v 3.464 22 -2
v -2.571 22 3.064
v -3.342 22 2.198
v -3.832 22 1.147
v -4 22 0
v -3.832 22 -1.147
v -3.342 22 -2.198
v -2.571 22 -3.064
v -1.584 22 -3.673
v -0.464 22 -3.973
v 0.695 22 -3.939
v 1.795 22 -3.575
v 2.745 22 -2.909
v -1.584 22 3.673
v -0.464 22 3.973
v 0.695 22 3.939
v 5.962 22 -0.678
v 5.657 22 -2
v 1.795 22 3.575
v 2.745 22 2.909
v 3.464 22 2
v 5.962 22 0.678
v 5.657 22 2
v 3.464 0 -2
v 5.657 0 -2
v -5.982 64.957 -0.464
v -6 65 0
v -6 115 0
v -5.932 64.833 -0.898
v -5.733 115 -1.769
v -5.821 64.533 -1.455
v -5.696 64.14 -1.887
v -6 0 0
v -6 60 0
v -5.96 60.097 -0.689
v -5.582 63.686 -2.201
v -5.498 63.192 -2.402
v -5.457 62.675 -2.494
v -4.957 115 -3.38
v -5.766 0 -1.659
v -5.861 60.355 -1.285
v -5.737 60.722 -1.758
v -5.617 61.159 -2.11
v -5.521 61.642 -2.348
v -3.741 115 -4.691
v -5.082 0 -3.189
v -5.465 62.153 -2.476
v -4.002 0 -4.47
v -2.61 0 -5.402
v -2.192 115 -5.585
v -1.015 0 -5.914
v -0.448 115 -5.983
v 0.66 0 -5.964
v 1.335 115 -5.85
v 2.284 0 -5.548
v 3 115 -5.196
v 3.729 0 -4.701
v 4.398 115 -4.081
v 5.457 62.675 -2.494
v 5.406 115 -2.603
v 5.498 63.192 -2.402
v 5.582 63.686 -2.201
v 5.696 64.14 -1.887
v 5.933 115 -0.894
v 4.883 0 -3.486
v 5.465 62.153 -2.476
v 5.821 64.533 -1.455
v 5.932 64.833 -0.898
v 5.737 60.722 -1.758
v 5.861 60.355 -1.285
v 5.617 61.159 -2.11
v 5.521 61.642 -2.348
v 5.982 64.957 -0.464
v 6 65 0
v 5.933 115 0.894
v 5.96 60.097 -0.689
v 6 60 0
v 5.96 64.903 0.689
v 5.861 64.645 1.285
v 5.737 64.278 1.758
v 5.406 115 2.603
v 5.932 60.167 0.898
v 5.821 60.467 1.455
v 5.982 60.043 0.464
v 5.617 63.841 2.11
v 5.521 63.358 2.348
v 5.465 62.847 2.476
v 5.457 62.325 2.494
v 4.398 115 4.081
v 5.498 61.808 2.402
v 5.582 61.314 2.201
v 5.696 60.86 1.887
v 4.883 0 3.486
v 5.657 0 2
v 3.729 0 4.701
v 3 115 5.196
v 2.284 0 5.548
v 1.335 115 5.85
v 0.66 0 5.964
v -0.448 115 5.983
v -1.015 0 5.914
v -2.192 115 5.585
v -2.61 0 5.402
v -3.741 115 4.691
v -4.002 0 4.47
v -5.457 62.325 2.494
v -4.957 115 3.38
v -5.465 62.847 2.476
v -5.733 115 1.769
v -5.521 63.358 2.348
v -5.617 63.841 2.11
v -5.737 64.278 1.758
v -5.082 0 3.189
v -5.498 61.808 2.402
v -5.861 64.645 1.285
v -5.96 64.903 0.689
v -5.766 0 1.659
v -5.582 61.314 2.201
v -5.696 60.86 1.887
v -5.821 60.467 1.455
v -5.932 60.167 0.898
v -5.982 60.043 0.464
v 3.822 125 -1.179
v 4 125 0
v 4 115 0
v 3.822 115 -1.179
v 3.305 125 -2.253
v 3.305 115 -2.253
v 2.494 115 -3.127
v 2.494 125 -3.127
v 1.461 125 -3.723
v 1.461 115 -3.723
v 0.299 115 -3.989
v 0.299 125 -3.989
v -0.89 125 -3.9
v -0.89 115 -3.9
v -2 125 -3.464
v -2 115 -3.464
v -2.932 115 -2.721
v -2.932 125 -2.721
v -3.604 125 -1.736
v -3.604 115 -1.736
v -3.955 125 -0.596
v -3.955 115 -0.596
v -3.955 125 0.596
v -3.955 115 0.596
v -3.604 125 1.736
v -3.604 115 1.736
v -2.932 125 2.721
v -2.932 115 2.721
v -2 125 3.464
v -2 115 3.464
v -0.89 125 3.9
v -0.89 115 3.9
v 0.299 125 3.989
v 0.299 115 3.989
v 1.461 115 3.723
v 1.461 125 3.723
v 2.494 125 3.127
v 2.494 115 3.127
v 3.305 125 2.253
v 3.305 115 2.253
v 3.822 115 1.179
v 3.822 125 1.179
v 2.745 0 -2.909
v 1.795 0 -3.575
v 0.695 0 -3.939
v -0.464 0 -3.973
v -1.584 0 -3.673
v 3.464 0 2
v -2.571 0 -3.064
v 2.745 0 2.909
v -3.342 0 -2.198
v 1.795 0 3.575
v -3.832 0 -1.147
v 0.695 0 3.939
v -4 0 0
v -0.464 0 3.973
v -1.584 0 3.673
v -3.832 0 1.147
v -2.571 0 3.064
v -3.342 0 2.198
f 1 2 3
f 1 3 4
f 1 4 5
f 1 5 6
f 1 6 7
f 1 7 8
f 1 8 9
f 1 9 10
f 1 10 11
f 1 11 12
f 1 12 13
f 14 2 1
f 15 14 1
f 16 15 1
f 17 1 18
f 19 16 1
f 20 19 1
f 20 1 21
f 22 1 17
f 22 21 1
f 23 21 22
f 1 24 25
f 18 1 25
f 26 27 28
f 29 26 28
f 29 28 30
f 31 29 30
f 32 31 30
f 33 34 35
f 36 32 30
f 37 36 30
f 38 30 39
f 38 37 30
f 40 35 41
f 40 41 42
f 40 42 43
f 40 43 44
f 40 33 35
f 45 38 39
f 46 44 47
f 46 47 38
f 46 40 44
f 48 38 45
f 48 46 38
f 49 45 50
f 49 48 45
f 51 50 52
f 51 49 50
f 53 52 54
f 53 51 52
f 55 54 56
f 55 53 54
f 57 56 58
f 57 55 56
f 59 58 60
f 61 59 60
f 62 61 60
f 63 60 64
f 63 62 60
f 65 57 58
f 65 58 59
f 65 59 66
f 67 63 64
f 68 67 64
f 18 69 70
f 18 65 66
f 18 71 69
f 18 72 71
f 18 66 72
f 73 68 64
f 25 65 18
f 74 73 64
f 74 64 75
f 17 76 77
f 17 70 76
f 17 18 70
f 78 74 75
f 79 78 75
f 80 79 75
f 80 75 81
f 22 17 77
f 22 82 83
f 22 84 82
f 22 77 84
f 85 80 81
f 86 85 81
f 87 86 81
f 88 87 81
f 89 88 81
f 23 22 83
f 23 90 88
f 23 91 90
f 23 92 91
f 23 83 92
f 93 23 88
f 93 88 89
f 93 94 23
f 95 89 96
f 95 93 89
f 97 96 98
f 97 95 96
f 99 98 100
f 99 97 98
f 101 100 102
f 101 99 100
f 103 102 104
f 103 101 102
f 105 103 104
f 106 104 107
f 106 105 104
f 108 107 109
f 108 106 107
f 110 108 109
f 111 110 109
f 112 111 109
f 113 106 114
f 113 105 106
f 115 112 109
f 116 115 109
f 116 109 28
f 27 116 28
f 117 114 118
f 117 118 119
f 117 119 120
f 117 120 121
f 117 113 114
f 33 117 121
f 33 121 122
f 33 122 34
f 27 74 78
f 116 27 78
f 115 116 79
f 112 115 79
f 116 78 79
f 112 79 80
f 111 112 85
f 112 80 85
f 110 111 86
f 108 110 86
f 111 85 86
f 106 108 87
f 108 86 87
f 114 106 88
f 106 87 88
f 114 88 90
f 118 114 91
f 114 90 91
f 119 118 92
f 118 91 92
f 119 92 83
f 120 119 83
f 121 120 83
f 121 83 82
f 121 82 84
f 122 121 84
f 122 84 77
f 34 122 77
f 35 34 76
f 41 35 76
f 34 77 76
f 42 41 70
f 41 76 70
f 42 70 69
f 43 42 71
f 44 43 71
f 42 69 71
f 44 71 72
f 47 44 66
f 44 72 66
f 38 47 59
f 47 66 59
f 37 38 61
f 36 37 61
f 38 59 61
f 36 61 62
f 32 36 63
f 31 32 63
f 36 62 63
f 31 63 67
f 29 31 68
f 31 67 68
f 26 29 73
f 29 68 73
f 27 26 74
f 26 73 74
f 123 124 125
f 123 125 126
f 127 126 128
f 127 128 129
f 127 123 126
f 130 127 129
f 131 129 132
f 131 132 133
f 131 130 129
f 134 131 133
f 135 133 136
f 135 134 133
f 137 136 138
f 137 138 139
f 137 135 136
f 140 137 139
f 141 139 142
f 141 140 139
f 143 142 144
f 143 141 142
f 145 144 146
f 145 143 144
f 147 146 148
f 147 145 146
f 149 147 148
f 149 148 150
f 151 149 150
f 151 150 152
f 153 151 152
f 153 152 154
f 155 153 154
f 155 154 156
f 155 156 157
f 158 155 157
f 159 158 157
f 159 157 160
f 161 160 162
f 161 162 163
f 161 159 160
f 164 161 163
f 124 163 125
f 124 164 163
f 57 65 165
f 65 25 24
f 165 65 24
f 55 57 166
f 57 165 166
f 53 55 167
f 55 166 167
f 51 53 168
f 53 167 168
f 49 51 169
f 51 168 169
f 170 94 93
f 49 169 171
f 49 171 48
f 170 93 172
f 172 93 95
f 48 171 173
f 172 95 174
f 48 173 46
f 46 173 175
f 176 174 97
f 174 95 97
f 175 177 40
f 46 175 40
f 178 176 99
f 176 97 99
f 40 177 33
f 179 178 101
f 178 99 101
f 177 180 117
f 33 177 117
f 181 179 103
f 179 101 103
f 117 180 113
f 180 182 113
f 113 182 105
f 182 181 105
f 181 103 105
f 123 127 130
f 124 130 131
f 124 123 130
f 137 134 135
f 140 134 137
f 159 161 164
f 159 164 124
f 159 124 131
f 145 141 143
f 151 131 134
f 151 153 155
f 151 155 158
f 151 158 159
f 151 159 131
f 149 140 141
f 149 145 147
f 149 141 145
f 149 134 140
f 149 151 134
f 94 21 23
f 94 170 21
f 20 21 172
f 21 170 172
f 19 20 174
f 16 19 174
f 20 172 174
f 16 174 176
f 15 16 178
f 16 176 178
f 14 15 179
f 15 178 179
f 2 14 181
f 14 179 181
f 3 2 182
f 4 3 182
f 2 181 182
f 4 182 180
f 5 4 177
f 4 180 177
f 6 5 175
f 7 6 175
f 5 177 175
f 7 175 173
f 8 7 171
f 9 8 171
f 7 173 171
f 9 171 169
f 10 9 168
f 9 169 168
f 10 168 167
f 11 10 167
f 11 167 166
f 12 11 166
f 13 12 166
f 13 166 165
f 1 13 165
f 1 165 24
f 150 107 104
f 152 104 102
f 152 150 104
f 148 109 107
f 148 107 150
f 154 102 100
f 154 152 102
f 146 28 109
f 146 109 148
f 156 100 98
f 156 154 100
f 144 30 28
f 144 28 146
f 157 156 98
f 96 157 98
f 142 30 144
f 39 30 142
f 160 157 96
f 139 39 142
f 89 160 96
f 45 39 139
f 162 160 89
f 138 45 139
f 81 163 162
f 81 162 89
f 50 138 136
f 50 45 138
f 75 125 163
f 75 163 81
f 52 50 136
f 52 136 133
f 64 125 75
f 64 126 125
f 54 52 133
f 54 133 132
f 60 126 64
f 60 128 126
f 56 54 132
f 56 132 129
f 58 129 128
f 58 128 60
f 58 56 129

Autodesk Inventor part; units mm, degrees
ref_plane "XZ Plane" through (0, 0, 0) normal (0, 1, 0) x (-1, 0, 0)
ref_plane "XY Plane" through (0, 0, 0) normal (0, 0, 1) x (1, 0, 0)
sketch "スケッチ1" plane through (0, 0, 0) normal (0, 1, 0) x (-1, 0, 0)
  circle A0 centre (0, 0) radius 6
  dimension "d0" = 12
extrude "押し出し1" add sketch "スケッチ1" along normal blind 125
ref_plane "作業平面1" through (6, 0, 0) normal (1, 0, 0) x (0, 1, 0)
sketch "スケッチ2" plane through (6, 0, 0) normal (1, 0, 0) x (0, 1, 0)
  circle A0 centre (62.5, 0) radius 2.5
  line L0 (125, -6) -> (125, 6) projected
  line L1 (125, 0) -> (0, 0) construction
  line L2 (0, -6) -> (0, 6) projected
  dimension "d3" = 5
  dimension "d7" = 62.5
extrude "押し出し2" cut sketch "スケッチ2" against normal through all
sketch "スケッチ3" plane through (0, 125, 0) normal (0, 1, 0) x (1, 0, 0)
  circle A0 centre (0, 0) radius 4
  circle A1 centre (0, 0) radius 6 projected
  dimension "d8" = 8
extrude "押し出し3" cut sketch "スケッチ3" against normal blind 10
sketch "スケッチ4" plane through (0, 0, 0) normal (0, -1, 0) x (1, 0, 0)
  circle A0 centre (0, 0) radius 4
  line L0 (3.4641, 2) -> (5.6569, 2)
  line L1 (3.4641, -2) -> (5.6569, -2)
  circle A1 centre (0, 0) radius 6 projected
  line L2 (0, 0) -> (6, 0) construction
  dimension "d11" = 8
  dimension "d12" = 4
extrude "押し出し4" cut sketch "スケッチ4" against normal blind 22 contours A0 | A0 L0 A1 L1 picked at (4.6336, -0.4576)
properties part number "omu_sh_jo_2" material "アルミニウム 6061-AHC"
